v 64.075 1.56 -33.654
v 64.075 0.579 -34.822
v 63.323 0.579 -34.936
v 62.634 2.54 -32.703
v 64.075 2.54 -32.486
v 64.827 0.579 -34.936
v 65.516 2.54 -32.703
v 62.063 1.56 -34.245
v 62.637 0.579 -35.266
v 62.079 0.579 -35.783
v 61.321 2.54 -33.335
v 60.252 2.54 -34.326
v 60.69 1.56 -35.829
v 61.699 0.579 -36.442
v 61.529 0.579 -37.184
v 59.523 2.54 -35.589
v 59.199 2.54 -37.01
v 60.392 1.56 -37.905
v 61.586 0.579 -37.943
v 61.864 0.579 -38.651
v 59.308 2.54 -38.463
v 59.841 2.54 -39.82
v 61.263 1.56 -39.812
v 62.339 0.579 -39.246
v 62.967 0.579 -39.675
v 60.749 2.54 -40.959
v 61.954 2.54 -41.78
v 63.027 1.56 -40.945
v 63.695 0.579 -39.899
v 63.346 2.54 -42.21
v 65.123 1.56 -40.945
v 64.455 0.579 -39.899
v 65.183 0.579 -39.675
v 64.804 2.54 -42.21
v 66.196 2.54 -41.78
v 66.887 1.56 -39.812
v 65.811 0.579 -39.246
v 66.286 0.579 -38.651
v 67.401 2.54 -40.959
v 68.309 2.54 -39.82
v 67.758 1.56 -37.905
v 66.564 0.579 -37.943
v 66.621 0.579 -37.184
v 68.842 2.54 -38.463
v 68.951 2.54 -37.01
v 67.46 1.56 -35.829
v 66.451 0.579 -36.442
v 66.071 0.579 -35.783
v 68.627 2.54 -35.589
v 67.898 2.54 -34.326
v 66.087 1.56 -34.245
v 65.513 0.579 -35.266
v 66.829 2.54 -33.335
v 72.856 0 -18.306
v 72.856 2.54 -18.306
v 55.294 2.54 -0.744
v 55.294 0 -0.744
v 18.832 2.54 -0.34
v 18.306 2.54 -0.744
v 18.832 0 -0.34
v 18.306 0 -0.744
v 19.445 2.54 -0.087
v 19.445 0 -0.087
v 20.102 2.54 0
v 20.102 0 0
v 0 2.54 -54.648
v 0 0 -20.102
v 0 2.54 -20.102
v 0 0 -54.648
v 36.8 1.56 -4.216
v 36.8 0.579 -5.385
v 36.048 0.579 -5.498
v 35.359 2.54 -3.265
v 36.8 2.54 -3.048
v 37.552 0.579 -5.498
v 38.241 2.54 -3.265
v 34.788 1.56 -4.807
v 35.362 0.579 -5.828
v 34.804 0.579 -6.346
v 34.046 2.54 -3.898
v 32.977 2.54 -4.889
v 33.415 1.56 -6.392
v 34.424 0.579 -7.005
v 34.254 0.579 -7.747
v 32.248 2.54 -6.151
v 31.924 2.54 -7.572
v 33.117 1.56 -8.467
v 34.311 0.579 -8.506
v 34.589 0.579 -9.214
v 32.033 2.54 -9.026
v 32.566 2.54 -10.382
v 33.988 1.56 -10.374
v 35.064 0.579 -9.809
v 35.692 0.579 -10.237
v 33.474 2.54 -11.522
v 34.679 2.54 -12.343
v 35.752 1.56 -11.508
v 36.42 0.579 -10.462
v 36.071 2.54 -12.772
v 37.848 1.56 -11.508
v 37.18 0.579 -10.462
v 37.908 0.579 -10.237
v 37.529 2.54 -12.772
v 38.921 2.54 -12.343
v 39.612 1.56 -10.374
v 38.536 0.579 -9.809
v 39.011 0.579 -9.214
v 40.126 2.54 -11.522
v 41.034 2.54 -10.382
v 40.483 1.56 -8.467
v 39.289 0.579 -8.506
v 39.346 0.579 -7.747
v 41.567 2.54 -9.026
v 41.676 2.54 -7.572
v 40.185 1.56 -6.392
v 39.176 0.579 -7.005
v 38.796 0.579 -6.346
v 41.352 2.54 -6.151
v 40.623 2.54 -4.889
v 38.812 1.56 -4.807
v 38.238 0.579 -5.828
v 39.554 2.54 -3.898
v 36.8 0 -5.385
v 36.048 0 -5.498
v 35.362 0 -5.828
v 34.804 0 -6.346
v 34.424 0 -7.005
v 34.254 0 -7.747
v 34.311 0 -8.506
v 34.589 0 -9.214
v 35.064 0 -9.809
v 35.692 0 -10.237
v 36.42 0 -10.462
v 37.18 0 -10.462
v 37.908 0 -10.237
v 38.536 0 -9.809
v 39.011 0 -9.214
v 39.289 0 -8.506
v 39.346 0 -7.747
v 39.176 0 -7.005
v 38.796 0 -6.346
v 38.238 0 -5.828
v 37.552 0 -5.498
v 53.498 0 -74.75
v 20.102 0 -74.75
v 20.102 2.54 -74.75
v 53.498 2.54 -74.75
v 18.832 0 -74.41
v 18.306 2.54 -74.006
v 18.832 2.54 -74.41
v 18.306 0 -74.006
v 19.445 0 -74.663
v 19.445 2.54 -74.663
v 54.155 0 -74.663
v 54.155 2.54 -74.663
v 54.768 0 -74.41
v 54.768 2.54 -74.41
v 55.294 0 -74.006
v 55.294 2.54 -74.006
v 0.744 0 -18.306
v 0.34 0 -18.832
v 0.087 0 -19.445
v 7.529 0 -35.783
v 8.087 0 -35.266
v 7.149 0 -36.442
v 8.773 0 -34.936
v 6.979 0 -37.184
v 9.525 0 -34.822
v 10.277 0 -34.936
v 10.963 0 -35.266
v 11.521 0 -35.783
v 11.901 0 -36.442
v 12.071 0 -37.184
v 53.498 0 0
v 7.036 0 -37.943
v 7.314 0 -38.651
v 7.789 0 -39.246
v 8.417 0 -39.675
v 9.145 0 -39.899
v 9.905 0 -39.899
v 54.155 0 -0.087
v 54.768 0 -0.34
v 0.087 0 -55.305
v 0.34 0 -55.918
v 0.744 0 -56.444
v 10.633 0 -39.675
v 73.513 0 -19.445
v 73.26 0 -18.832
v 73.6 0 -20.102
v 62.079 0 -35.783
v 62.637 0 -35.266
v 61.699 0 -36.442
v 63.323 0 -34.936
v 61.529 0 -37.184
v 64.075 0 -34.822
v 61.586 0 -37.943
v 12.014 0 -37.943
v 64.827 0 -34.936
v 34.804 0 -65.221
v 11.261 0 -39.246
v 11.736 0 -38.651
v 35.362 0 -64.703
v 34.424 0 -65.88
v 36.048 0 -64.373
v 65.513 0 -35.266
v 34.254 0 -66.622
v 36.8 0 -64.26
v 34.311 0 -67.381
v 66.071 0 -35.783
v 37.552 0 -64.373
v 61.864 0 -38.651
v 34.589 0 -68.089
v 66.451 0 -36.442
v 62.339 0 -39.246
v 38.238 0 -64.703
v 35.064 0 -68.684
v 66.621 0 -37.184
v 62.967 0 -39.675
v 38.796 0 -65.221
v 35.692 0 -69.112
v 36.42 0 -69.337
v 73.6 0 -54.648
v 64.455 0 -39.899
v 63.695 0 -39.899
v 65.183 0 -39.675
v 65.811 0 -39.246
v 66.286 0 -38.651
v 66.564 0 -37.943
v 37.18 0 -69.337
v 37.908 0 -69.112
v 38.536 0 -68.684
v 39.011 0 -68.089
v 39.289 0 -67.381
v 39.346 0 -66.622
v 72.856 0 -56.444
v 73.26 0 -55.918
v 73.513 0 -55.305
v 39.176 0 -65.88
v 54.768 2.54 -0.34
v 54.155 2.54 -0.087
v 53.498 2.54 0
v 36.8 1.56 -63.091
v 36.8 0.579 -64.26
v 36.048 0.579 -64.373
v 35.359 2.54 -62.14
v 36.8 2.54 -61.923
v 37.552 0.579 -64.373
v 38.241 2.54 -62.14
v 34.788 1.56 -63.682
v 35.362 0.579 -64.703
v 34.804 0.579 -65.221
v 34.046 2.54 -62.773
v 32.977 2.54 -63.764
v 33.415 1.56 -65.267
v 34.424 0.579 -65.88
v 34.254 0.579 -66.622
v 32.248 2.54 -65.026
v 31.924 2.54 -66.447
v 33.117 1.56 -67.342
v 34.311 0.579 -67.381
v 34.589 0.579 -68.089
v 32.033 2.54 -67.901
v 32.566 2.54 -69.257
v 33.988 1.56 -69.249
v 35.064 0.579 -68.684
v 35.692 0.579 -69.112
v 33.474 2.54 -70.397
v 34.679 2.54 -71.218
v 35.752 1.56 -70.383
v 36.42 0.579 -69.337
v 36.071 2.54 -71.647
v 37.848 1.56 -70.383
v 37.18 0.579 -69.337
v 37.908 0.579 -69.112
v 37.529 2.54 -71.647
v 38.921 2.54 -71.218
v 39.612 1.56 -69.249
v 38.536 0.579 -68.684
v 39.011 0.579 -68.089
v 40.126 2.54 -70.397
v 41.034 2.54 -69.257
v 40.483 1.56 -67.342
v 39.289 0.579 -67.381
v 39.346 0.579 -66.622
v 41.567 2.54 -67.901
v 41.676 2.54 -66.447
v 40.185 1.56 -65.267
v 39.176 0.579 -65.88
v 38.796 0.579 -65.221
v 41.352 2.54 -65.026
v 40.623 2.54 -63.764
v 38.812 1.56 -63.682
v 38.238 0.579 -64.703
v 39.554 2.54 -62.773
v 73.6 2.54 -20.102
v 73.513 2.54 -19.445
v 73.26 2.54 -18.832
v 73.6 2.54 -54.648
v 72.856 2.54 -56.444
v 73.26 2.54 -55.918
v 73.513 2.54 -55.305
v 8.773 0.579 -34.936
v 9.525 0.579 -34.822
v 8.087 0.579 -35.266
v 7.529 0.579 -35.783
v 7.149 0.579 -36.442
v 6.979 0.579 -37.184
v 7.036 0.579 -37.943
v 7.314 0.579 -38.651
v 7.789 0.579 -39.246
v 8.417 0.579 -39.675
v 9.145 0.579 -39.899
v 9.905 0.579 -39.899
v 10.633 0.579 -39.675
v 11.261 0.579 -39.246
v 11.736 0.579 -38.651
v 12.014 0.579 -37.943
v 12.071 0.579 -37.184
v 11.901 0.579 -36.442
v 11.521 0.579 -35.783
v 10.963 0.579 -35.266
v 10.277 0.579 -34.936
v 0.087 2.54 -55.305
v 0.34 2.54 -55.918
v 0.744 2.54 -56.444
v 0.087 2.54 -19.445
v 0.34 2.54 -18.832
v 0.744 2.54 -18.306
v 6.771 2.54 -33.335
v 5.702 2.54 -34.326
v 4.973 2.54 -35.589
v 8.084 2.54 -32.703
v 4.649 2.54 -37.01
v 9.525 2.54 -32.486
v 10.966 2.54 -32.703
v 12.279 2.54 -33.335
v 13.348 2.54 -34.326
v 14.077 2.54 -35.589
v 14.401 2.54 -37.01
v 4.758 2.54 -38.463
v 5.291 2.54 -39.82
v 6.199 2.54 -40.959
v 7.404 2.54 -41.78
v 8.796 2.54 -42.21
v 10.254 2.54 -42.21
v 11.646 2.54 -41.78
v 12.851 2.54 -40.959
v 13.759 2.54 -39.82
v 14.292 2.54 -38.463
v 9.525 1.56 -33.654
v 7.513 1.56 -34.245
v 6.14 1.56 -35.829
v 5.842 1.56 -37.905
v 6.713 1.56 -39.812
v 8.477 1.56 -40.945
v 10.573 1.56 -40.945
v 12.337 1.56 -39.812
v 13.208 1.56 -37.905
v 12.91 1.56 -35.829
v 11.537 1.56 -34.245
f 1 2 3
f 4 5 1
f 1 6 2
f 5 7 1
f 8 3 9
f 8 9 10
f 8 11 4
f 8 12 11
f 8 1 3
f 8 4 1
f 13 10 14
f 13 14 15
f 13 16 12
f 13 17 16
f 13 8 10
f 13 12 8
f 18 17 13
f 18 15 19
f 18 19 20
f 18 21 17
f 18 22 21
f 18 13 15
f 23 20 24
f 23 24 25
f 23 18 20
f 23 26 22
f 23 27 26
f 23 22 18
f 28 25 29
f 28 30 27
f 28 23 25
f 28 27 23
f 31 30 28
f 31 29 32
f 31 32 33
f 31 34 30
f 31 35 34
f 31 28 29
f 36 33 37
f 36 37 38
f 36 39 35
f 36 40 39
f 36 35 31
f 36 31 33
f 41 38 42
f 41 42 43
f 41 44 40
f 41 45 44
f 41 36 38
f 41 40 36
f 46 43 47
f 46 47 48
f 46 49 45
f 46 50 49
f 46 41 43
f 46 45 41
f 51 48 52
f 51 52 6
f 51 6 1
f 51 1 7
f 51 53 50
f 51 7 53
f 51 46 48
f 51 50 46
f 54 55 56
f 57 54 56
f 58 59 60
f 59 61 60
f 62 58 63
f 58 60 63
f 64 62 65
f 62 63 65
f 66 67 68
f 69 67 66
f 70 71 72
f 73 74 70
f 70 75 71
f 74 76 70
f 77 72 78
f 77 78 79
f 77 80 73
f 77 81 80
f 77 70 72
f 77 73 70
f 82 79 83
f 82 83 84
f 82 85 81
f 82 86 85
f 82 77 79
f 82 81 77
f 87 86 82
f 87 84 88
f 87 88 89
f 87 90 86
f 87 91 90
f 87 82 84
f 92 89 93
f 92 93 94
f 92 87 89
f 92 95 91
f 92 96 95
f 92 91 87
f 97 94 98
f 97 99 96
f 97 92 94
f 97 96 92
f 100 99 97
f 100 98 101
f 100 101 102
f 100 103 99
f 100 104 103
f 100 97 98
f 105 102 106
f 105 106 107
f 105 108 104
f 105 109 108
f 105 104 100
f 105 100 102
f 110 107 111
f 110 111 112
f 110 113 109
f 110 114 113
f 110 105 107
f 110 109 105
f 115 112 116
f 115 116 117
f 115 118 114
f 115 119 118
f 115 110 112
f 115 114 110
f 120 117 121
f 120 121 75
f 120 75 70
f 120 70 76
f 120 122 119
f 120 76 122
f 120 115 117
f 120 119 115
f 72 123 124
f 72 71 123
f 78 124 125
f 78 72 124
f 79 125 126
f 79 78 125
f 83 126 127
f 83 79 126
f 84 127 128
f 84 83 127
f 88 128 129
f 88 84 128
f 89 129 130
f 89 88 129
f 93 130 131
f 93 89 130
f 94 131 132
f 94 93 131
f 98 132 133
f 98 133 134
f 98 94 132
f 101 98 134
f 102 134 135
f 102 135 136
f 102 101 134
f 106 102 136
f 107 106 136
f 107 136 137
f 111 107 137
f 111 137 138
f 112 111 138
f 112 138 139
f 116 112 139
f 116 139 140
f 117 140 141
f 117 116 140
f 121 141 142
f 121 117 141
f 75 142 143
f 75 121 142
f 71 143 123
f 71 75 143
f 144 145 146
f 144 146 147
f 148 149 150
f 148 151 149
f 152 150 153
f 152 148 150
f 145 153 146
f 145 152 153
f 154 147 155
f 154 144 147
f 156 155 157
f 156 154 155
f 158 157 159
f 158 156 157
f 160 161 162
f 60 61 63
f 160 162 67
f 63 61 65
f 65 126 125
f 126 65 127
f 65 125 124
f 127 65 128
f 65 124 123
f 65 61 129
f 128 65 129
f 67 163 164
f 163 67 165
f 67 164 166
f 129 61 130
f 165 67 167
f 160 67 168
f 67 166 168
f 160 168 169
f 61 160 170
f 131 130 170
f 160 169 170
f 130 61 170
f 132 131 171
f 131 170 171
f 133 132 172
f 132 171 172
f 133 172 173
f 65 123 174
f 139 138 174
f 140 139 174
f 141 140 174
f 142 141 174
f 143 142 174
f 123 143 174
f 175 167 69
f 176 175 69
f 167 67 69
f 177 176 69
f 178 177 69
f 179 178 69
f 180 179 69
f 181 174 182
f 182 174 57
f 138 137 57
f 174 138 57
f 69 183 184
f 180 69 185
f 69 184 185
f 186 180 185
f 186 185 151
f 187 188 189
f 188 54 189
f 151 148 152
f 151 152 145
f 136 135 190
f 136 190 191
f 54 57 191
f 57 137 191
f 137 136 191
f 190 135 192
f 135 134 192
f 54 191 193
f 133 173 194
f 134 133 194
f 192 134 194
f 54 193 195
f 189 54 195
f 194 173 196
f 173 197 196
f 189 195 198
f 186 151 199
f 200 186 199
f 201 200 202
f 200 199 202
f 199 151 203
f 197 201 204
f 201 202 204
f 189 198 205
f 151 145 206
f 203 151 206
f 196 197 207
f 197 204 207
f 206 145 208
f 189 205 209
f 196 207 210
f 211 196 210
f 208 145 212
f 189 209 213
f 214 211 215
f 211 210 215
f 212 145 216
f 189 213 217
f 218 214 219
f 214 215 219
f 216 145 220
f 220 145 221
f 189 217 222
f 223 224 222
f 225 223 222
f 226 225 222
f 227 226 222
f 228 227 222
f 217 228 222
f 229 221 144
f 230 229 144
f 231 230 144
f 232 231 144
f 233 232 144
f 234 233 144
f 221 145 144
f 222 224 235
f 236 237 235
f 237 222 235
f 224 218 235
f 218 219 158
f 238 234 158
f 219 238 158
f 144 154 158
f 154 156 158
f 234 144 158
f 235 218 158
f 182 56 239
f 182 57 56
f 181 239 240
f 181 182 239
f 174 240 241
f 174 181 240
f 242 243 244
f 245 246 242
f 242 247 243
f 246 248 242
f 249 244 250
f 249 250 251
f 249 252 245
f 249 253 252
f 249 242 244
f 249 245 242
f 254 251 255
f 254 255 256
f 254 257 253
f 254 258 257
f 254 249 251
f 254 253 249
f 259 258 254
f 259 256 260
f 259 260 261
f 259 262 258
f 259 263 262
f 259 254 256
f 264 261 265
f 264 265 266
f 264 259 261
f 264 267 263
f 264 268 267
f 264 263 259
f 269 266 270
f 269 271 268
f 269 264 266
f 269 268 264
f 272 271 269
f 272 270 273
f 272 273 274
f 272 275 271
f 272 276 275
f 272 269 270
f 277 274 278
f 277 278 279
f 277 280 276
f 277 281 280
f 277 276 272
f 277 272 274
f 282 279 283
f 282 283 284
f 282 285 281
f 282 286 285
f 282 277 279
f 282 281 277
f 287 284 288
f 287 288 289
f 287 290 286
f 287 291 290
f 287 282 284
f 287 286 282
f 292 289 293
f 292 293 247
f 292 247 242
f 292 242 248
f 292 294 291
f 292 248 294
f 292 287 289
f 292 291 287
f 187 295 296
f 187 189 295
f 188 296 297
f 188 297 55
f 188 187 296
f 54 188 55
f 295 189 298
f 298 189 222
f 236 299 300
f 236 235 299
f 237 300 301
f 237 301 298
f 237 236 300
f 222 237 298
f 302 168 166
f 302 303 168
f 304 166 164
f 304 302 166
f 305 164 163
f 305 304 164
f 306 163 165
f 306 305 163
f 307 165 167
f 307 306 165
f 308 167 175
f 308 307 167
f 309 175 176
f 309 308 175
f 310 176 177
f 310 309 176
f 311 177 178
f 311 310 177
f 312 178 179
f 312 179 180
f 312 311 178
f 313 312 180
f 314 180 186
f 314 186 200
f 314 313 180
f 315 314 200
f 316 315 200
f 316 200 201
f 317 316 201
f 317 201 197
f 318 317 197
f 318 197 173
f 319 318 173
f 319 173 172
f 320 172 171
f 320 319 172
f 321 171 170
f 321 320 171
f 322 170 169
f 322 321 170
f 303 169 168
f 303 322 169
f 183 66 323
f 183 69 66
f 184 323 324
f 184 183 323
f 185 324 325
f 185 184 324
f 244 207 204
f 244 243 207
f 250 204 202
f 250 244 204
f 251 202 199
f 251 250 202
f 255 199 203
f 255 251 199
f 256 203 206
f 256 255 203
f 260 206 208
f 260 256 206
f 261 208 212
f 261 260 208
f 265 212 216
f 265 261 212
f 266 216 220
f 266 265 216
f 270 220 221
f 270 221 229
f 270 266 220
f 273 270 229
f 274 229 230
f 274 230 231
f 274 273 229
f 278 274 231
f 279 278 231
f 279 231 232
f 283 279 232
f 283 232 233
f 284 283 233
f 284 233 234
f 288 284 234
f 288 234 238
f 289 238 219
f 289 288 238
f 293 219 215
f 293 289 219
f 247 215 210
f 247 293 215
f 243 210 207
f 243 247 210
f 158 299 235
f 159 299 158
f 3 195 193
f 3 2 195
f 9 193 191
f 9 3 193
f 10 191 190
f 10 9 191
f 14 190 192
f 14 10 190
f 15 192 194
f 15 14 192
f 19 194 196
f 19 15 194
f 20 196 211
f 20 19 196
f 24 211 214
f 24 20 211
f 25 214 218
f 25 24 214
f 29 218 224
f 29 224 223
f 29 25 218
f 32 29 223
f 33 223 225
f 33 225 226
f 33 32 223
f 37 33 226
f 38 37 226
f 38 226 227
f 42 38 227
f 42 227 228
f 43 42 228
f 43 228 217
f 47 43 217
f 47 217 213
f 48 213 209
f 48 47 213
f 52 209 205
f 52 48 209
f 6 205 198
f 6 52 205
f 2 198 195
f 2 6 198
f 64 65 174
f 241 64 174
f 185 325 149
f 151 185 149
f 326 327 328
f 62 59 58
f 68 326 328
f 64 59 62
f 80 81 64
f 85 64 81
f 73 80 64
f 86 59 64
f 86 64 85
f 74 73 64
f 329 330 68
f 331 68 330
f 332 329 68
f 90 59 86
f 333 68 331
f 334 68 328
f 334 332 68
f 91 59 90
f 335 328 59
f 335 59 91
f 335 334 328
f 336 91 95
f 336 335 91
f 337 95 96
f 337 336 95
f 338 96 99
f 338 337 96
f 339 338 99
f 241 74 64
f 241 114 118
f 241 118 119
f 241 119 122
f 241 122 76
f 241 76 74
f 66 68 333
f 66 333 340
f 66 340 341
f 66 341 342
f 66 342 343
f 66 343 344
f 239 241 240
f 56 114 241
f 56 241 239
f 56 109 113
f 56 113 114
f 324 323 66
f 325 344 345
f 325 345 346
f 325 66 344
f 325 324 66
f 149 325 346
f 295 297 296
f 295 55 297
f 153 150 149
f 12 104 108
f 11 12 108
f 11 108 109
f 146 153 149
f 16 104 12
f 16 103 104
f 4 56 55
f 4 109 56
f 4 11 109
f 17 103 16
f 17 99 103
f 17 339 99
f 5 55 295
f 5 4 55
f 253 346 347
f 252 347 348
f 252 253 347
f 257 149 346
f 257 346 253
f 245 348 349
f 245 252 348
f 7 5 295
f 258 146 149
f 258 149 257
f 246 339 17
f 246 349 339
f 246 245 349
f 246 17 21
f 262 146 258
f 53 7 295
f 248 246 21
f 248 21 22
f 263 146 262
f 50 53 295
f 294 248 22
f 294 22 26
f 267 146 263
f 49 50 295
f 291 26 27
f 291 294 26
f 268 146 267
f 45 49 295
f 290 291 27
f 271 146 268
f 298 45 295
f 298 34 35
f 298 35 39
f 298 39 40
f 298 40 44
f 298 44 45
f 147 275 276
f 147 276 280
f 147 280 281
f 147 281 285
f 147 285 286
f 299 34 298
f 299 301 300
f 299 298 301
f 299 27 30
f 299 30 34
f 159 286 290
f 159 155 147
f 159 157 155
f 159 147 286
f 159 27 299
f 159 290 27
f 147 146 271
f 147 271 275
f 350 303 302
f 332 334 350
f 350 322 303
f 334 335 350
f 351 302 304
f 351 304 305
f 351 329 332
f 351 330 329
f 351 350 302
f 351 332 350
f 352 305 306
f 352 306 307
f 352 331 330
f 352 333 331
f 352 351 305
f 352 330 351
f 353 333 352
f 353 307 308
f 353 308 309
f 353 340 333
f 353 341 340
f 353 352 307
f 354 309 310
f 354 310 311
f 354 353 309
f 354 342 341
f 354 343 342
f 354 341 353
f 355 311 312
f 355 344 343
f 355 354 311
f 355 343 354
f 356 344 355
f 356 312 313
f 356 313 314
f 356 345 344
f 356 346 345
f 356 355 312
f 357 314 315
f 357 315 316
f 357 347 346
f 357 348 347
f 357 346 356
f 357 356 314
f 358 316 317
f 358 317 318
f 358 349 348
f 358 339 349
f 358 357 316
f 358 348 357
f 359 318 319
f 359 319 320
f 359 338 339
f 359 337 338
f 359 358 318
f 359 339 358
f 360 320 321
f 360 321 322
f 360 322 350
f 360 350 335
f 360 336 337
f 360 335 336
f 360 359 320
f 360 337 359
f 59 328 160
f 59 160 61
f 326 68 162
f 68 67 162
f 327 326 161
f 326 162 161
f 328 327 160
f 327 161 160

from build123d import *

# Parameters (mm, degrees)
MAIN_BASE_DIM_W                            = 73.60000012
MAIN_BASE_DIM_H                            = 74.750000106
MAIN_BASE_DEPTH                            = 2.54
CSK_FOR_10_FLAT_HEAD_MACHINE_SCREW_2_COUNT = 2
CSK_FOR_10_FLAT_HEAD_MACHINE_SCREW_2_PITCH = 40.130936127
CSK_FOR_10_FLAT_HEAD_MACHINE_SCREW_3_COUNT = 2
CSK_FOR_10_FLAT_HEAD_MACHINE_SCREW_3_PITCH = 54.55000006
CSK_FOR_10_FLAT_HEAD_MACHINE_SCREW_4_COUNT = 2
CSK_FOR_10_FLAT_HEAD_MACHINE_SCREW_4_PITCH = 40.130936127
CONER_CUT_DEPTH                            = 2.54
F_1IN_FILLET_R                             = 2.54


with BuildPart() as part:
    # Main_Base_Dim → Main_Base (new body)
    with BuildSketch(Plane(origin=(0, 0, 0), x_dir=(1, 0, 0), z_dir=(0, 1, 0))):
        with Locations((36.80000006, 37.375000053)):
            Rectangle(MAIN_BASE_DIM_W, MAIN_BASE_DIM_H)
    extrude(amount=MAIN_BASE_DEPTH)

    # Sketch4 → CSK for #10 Flat Head Machine Screw (100)1 (revolve, cut)
    with BuildSketch(Plane(origin=(9.52500003, 2.54, -37.375000053), x_dir=(0, 0, 1), z_dir=(1, 0, 0))):
        Polygon((0, 0), (0, 2.54), (2.5527, 2.54), (2.5527, 1.960808018), (4.8895, 0), align=None)
    csk_for_10_flat_head_machine_screw_100 = revolve(axis=Axis((9.52500003, 8.89, -37.375000053), (0, -1, 0)), mode=Mode.SUBTRACT)

    # CSK for _10 Flat Head Machine Screw  2: CSK for #10 Flat Head Machine Screw (100)1 ×2
    with Locations(*[Vector(0.679650232, 0, 0.73353634) * (i * CSK_FOR_10_FLAT_HEAD_MACHINE_SCREW_2_PITCH) for i in range(1, CSK_FOR_10_FLAT_HEAD_MACHINE_SCREW_2_COUNT)]):
        add(csk_for_10_flat_head_machine_screw_100, mode=Mode.SUBTRACT)

    # CSK for _10 Flat Head Machine Screw  3: CSK for #10 Flat Head Machine Screw (100)1 ×2
    with Locations(*[(i * CSK_FOR_10_FLAT_HEAD_MACHINE_SCREW_3_PITCH, 0, 0) for i in range(1, CSK_FOR_10_FLAT_HEAD_MACHINE_SCREW_3_COUNT)]):
        add(csk_for_10_flat_head_machine_screw_100, mode=Mode.SUBTRACT)

    # CSK for _10 Flat Head Machine Screw  4: CSK for #10 Flat Head Machine Screw (100)1 ×2
    with Locations(*[Vector(0.679650232, 0, -0.73353634) * (i * CSK_FOR_10_FLAT_HEAD_MACHINE_SCREW_4_PITCH) for i in range(1, CSK_FOR_10_FLAT_HEAD_MACHINE_SCREW_4_COUNT)]):
        add(csk_for_10_flat_head_machine_screw_100, mode=Mode.SUBTRACT)

    # Corner_Cut_Dim → Coner_Cut (cut)
    with BuildSketch(Plane(origin=(0, 2.54, 0), x_dir=(1, 0, 0), z_dir=(0, 1, 0))):
        Polygon((0, 0), (0, 19.05), (19.05, 0), align=None)
        Polygon((54.55000012, 0), (73.60000012, 0), (73.60000012, 19.05), align=None)
        Polygon((73.60000012, 74.750000106), (73.60000012, 55.700000106), (54.55000012, 74.750000106), align=None)
        Polygon((0, 55.700000106), (19.05, 74.750000106), (0, 74.750000106), align=None)
    extrude(amount=-CONER_CUT_DEPTH, mode=Mode.SUBTRACT)

    # .1in_Fillet
    f_1in_fillet_edges = [part.edges().sort_by_distance(p)[0] for p in [
        (19.05, 1.27, -74.750000106),
        (0, 1.27, -55.700000106),
        (73.60000012, 1.27, -55.700000106),
        (54.55000012, 1.27, -74.750000106),
        (73.60000012, 1.27, -19.05),
        (54.55000012, 1.27, 0),
        (0, 1.27, -19.05),
        (19.05, 1.27, 0),
    ]]
    fillet(f_1in_fillet_edges, radius=F_1IN_FILLET_R)


solid = part.part
